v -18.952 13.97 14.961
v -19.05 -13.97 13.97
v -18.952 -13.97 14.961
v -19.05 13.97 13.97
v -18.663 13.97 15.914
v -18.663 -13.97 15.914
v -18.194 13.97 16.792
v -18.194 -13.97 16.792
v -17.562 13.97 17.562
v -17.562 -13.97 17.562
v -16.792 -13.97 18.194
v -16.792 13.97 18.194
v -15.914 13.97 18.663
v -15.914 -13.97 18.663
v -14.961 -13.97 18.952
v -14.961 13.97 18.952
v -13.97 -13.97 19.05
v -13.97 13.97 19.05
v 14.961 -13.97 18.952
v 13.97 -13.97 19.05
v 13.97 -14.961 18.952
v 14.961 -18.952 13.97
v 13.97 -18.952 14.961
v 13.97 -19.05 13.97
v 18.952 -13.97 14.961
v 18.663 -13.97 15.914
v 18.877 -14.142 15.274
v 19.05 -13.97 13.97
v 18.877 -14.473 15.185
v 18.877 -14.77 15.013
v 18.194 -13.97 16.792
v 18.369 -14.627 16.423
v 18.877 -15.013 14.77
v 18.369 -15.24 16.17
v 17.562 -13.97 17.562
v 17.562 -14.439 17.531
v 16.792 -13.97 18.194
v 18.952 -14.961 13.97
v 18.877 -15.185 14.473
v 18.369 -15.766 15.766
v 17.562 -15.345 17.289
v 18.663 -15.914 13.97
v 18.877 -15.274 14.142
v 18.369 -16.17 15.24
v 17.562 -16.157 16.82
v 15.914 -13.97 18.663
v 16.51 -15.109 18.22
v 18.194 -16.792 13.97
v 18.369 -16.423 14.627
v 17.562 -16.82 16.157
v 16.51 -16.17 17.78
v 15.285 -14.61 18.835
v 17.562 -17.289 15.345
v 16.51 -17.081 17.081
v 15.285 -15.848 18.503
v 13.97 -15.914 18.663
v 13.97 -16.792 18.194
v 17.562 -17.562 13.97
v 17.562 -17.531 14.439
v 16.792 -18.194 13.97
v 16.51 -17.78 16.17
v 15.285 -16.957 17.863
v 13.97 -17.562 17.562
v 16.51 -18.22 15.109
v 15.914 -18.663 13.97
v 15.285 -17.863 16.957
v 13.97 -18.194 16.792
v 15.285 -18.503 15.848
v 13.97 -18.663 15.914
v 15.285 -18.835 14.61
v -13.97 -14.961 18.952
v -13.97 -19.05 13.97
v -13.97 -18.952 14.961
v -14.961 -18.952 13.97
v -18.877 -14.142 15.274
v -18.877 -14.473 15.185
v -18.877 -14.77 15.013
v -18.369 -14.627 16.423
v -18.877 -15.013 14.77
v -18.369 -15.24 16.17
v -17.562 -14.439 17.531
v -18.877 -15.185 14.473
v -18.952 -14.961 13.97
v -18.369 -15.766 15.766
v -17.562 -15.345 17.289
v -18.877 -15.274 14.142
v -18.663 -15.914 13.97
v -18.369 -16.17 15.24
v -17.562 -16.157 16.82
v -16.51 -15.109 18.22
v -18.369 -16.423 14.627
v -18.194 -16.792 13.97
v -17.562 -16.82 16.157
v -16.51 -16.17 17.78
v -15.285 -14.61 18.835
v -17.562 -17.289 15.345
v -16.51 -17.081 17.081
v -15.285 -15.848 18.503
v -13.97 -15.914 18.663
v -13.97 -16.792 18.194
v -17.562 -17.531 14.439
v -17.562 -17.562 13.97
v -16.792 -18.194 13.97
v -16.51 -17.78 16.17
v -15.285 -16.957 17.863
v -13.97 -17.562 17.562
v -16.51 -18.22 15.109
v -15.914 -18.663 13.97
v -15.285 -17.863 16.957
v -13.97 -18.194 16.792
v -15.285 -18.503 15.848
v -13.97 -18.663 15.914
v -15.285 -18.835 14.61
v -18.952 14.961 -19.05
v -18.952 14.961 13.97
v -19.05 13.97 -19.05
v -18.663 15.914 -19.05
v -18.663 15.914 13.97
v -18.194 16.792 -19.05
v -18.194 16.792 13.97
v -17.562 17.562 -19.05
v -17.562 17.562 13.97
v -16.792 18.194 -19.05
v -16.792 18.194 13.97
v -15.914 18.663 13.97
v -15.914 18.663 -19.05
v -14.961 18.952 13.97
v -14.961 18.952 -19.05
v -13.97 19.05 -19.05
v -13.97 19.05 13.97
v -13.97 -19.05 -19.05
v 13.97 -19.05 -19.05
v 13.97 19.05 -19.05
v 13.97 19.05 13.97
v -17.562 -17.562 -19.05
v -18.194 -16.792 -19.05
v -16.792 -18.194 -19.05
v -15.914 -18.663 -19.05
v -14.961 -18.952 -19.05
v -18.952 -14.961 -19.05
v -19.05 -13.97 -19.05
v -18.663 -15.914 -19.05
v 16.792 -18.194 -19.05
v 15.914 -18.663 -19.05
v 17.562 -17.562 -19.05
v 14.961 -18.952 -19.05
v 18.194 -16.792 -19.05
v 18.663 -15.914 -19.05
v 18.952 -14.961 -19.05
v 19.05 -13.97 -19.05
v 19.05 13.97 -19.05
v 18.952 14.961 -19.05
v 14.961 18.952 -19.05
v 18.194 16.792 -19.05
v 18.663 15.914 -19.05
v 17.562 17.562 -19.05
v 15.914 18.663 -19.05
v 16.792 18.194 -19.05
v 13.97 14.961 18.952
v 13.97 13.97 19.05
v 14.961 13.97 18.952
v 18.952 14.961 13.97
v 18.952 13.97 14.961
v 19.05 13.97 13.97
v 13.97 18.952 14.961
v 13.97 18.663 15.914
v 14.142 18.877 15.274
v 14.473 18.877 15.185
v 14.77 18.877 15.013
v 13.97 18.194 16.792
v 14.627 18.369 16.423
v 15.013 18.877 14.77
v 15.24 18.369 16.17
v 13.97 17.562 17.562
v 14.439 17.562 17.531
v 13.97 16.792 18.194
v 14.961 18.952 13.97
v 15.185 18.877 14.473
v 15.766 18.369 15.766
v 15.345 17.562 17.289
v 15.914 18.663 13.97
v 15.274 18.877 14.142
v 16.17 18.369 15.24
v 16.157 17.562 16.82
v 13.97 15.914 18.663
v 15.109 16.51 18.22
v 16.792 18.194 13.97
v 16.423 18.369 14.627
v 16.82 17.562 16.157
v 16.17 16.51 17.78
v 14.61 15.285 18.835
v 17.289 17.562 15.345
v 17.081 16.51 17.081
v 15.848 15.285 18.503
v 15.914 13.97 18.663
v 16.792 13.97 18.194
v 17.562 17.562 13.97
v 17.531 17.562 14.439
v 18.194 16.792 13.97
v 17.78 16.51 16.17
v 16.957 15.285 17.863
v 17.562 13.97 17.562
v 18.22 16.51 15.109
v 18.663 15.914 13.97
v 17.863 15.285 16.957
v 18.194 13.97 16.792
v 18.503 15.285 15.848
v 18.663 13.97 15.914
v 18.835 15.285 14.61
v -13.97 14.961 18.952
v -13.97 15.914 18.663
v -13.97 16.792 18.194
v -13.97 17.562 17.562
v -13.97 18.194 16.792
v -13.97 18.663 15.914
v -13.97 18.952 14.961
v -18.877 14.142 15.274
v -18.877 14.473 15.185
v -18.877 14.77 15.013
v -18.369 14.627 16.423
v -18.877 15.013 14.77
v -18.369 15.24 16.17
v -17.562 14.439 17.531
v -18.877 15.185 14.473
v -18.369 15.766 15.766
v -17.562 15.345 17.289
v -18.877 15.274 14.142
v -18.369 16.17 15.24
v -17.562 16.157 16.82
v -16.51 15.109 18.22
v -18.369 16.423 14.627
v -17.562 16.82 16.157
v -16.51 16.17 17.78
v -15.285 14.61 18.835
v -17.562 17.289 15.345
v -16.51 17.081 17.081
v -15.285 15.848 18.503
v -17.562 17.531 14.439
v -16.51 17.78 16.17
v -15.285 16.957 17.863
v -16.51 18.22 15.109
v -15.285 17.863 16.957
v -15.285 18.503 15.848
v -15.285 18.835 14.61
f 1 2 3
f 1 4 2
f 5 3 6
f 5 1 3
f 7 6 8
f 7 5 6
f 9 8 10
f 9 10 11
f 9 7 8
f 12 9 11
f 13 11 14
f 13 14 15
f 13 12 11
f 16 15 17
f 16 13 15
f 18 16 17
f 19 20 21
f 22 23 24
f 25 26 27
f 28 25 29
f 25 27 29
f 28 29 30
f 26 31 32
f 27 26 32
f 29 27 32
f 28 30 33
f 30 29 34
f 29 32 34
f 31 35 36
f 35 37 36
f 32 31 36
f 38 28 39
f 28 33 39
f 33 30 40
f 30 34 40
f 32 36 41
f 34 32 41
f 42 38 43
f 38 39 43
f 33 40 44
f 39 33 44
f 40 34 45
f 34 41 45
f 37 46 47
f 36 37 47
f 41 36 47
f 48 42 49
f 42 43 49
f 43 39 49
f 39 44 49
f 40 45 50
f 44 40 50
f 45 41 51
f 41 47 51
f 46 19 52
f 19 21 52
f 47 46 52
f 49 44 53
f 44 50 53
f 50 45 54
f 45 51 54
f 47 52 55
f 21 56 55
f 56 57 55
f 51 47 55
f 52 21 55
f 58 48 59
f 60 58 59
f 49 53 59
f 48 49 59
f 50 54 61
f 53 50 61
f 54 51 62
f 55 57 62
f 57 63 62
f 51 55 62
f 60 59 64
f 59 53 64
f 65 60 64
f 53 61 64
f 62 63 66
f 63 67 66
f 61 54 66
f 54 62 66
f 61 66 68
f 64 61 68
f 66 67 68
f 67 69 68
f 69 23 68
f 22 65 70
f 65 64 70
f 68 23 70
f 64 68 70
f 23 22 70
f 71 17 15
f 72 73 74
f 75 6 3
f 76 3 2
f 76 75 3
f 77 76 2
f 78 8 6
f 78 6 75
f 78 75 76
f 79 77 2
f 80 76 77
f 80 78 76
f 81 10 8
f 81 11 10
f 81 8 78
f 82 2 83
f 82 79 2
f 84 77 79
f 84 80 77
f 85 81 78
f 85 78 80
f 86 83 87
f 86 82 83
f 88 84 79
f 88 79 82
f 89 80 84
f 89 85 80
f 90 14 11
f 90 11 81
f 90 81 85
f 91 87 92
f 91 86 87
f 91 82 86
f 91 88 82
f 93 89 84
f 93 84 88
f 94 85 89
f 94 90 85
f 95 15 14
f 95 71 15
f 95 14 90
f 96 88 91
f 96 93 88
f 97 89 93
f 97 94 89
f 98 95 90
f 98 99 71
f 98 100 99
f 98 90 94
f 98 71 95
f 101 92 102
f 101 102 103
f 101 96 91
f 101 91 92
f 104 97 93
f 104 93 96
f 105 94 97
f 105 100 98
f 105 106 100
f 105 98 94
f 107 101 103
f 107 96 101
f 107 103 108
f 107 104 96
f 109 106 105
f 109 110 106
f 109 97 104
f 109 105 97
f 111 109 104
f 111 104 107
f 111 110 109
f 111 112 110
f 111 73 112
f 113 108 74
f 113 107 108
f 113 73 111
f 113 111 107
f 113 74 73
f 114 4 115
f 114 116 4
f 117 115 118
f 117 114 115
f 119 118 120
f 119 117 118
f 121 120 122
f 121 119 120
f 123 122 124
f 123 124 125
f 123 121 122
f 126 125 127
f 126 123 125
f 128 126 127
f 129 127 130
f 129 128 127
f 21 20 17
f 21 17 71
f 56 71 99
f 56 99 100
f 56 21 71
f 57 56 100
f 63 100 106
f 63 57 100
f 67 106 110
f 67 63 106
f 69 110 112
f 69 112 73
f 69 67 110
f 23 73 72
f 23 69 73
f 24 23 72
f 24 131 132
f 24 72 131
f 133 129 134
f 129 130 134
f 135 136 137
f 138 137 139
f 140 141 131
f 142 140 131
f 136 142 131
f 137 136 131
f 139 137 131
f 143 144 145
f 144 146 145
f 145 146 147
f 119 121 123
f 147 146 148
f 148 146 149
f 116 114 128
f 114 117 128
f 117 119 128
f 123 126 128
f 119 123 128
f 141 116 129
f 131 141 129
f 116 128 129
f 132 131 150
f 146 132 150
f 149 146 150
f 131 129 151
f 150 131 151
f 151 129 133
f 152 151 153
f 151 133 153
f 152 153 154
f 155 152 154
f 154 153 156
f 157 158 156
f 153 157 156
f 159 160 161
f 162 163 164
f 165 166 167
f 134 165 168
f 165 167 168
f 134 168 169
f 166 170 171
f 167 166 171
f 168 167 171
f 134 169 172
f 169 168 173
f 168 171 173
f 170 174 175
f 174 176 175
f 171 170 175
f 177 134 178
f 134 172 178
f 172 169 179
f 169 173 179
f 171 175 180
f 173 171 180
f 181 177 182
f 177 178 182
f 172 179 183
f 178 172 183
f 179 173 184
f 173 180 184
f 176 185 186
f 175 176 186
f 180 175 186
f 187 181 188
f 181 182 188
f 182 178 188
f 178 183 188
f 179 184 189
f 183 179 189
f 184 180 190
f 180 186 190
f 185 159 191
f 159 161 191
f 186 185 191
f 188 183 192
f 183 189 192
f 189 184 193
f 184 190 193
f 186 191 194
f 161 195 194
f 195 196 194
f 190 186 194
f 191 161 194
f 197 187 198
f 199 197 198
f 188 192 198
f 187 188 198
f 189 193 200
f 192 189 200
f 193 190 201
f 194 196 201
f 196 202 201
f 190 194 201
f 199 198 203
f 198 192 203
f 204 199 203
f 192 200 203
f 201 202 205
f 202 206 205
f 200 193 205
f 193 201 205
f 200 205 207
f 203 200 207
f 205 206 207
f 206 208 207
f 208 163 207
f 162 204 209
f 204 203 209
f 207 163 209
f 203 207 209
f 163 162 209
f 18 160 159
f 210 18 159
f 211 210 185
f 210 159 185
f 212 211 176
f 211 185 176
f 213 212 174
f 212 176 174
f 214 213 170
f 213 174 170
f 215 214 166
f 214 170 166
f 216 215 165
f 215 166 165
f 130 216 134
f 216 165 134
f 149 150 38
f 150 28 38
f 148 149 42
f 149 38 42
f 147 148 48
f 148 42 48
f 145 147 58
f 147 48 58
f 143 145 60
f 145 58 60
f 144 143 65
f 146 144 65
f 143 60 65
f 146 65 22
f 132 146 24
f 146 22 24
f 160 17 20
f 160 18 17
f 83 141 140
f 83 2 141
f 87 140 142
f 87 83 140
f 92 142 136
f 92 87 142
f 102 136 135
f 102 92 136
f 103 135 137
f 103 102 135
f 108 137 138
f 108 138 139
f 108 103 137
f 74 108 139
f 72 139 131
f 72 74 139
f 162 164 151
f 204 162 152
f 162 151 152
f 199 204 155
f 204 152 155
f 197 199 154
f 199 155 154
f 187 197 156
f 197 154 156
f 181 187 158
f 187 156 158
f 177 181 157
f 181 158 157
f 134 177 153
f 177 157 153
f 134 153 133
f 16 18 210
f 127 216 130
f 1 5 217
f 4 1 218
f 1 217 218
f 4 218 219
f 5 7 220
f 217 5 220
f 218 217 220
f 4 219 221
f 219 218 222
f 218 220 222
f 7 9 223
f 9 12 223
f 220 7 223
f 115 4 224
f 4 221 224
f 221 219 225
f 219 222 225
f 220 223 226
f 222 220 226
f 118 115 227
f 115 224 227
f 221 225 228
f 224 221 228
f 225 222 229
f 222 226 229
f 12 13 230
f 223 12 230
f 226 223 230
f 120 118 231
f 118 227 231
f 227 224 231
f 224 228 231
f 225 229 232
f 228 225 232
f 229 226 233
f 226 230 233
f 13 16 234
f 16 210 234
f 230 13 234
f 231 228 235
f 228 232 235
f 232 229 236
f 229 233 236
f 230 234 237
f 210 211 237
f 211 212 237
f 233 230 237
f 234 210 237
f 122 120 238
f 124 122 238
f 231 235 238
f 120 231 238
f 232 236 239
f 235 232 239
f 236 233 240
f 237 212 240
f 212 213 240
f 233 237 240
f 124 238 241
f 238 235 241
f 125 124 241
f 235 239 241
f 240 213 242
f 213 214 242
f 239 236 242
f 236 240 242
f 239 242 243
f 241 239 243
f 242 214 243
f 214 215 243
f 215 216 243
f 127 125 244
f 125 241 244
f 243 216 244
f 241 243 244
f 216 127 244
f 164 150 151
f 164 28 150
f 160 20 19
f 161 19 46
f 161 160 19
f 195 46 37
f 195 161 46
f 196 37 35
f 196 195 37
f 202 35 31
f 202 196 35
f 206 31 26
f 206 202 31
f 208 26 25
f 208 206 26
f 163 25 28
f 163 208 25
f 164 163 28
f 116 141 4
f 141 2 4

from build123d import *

# Parameters (mm, degrees)
F1_W     = 38.1
F1_H     = 38.1
F2_DEPTH = 19.05
F3_R     = 5.08


with BuildPart() as f2:
    # F1 (on face) → F2 (new body, symmetric)
    with BuildSketch(Plane.XY):
        Rectangle(F1_W, F1_H)
    extrude(amount=F2_DEPTH, both=True)

    # F3
    f3_edges = [f2.edges().sort_by_distance(p)[0] for p in [
        (0, -19.05, 19.05),
        (19.05, 0, 19.05),
        (0, 19.05, 19.05),
        (-19.05, 0, 19.05),
        (19.05, -19.05, 0),
        (-19.05, -19.05, 0),
        (19.05, 19.05, 0),
        (-19.05, 19.05, 0),
    ]]
    fillet(f3_edges, radius=F3_R)


solid = f2.part
